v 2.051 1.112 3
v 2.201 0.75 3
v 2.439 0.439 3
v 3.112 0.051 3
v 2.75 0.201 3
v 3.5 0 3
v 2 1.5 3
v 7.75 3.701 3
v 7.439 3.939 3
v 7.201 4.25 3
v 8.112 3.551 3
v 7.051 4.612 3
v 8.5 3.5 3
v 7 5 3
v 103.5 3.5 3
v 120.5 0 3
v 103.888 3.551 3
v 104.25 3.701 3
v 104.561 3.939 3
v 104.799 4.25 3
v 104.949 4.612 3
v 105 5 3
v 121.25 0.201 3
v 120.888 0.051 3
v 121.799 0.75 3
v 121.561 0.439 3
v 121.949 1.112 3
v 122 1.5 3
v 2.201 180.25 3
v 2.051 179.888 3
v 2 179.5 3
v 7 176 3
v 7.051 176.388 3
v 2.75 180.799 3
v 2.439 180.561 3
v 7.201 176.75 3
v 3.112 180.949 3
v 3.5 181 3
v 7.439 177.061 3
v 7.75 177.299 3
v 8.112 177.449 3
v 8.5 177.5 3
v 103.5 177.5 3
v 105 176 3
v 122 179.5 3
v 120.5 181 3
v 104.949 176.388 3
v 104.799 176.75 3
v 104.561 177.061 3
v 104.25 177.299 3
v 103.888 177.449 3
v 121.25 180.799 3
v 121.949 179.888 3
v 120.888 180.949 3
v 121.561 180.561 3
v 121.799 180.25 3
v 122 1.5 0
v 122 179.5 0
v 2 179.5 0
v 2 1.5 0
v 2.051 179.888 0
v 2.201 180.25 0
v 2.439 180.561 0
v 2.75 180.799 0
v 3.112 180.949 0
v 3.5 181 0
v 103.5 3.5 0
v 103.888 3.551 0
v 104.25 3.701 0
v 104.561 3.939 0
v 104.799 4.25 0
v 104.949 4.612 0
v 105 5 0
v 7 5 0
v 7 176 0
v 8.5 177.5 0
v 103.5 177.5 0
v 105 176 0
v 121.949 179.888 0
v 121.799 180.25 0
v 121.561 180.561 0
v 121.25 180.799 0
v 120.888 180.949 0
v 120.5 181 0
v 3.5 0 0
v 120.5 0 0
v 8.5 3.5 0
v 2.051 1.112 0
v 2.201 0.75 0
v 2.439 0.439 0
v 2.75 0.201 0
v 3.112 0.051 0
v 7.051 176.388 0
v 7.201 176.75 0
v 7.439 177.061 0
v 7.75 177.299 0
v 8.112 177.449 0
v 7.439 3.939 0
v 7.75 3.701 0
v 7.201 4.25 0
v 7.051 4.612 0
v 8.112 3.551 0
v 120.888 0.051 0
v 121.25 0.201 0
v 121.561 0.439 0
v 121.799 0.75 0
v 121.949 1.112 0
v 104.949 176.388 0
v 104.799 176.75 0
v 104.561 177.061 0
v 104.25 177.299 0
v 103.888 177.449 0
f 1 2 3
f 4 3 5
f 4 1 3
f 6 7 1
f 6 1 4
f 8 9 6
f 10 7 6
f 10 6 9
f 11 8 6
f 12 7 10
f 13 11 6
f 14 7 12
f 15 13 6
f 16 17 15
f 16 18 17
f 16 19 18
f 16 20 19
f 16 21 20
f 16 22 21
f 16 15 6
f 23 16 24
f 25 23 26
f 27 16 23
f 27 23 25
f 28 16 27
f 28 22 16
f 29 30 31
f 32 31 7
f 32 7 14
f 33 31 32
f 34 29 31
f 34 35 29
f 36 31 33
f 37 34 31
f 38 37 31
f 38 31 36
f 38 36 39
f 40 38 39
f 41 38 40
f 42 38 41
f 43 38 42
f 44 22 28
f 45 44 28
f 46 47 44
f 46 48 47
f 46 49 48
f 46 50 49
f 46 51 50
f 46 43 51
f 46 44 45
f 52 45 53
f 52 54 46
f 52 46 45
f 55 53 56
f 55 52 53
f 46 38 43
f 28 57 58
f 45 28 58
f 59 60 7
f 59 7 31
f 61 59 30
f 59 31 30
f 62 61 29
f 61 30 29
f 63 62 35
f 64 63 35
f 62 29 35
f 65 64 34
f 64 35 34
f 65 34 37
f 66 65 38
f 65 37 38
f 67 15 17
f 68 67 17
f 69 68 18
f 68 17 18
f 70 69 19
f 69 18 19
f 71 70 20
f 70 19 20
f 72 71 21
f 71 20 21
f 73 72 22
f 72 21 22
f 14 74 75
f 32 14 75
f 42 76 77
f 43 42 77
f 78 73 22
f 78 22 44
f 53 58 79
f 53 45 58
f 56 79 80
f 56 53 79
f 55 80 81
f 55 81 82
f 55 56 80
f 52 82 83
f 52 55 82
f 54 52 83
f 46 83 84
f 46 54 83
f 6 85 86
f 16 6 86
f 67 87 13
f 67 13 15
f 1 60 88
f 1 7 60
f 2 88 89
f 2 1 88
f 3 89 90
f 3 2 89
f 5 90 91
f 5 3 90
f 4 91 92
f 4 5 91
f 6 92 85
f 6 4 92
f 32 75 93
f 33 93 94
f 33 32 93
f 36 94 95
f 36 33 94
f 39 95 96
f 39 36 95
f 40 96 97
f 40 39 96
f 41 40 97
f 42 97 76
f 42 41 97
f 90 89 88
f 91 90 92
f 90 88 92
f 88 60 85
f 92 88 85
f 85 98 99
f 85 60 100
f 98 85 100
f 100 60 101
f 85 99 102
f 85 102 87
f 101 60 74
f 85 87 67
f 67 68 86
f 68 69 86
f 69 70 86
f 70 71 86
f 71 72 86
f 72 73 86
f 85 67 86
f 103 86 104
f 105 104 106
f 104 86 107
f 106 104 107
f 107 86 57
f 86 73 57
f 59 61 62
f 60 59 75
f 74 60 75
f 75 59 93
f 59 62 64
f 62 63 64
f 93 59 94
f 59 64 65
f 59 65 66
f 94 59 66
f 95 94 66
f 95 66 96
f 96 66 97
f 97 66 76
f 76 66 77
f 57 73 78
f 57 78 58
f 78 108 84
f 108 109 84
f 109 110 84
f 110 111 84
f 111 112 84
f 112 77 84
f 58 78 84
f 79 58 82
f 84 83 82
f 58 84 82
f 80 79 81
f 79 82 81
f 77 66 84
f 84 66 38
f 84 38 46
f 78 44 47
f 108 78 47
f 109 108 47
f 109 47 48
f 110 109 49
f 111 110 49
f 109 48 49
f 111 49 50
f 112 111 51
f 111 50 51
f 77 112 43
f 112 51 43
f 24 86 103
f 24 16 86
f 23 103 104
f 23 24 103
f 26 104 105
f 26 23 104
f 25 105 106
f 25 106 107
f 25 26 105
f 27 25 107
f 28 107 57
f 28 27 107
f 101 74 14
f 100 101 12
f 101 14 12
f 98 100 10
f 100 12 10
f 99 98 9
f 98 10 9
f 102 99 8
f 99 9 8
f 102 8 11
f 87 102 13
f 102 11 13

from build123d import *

# Parameters (mm, degrees)
BOX001_W     = 98
BOX001_H     = 174
BOX001_DEPTH = 10
FILLET_R     = 1.5
BOX_W        = 120
BOX_H        = 181
BOX_DEPTH    = 3
FILLET001_R  = 1.5


with BuildPart() as fillet_body:
    # Box001 → Box001 (new body)
    with BuildSketch(Plane(origin=(7, 3.5, 0), x_dir=(1, 0, 0), z_dir=(0, 0, 1))):
        with Locations((49, 87)):
            Rectangle(BOX001_W, BOX001_H)
    extrude(amount=BOX001_DEPTH)

    # Fillet
    fillet_edges = [fillet_body.edges().sort_by_distance(p)[0] for p in [
        (7, 3.5, 5),
        (7, 177.5, 5),
        (105, 3.5, 5),
        (105, 177.5, 5),
    ]]
    fillet(fillet_edges, radius=FILLET_R)


with BuildPart() as cut:
    # Box → Box (new body)
    with BuildSketch(Plane(origin=(2, 0, 0), x_dir=(1, 0, 0), z_dir=(0, 0, 1))):
        with Locations((60, 90.5)):
            Rectangle(BOX_W, BOX_H)
    extrude(amount=BOX_DEPTH)

    # Fillet001
    fillet001_edges = [cut.edges().sort_by_distance(p)[0] for p in [
        (2, 0, 1.5),
        (2, 181, 1.5),
        (122, 0, 1.5),
        (122, 181, 1.5),
    ]]
    fillet(fillet001_edges, radius=FILLET001_R)

    # Cut: cut Fillet body
    add(fillet_body.part, mode=Mode.SUBTRACT)


solid = cut.part
